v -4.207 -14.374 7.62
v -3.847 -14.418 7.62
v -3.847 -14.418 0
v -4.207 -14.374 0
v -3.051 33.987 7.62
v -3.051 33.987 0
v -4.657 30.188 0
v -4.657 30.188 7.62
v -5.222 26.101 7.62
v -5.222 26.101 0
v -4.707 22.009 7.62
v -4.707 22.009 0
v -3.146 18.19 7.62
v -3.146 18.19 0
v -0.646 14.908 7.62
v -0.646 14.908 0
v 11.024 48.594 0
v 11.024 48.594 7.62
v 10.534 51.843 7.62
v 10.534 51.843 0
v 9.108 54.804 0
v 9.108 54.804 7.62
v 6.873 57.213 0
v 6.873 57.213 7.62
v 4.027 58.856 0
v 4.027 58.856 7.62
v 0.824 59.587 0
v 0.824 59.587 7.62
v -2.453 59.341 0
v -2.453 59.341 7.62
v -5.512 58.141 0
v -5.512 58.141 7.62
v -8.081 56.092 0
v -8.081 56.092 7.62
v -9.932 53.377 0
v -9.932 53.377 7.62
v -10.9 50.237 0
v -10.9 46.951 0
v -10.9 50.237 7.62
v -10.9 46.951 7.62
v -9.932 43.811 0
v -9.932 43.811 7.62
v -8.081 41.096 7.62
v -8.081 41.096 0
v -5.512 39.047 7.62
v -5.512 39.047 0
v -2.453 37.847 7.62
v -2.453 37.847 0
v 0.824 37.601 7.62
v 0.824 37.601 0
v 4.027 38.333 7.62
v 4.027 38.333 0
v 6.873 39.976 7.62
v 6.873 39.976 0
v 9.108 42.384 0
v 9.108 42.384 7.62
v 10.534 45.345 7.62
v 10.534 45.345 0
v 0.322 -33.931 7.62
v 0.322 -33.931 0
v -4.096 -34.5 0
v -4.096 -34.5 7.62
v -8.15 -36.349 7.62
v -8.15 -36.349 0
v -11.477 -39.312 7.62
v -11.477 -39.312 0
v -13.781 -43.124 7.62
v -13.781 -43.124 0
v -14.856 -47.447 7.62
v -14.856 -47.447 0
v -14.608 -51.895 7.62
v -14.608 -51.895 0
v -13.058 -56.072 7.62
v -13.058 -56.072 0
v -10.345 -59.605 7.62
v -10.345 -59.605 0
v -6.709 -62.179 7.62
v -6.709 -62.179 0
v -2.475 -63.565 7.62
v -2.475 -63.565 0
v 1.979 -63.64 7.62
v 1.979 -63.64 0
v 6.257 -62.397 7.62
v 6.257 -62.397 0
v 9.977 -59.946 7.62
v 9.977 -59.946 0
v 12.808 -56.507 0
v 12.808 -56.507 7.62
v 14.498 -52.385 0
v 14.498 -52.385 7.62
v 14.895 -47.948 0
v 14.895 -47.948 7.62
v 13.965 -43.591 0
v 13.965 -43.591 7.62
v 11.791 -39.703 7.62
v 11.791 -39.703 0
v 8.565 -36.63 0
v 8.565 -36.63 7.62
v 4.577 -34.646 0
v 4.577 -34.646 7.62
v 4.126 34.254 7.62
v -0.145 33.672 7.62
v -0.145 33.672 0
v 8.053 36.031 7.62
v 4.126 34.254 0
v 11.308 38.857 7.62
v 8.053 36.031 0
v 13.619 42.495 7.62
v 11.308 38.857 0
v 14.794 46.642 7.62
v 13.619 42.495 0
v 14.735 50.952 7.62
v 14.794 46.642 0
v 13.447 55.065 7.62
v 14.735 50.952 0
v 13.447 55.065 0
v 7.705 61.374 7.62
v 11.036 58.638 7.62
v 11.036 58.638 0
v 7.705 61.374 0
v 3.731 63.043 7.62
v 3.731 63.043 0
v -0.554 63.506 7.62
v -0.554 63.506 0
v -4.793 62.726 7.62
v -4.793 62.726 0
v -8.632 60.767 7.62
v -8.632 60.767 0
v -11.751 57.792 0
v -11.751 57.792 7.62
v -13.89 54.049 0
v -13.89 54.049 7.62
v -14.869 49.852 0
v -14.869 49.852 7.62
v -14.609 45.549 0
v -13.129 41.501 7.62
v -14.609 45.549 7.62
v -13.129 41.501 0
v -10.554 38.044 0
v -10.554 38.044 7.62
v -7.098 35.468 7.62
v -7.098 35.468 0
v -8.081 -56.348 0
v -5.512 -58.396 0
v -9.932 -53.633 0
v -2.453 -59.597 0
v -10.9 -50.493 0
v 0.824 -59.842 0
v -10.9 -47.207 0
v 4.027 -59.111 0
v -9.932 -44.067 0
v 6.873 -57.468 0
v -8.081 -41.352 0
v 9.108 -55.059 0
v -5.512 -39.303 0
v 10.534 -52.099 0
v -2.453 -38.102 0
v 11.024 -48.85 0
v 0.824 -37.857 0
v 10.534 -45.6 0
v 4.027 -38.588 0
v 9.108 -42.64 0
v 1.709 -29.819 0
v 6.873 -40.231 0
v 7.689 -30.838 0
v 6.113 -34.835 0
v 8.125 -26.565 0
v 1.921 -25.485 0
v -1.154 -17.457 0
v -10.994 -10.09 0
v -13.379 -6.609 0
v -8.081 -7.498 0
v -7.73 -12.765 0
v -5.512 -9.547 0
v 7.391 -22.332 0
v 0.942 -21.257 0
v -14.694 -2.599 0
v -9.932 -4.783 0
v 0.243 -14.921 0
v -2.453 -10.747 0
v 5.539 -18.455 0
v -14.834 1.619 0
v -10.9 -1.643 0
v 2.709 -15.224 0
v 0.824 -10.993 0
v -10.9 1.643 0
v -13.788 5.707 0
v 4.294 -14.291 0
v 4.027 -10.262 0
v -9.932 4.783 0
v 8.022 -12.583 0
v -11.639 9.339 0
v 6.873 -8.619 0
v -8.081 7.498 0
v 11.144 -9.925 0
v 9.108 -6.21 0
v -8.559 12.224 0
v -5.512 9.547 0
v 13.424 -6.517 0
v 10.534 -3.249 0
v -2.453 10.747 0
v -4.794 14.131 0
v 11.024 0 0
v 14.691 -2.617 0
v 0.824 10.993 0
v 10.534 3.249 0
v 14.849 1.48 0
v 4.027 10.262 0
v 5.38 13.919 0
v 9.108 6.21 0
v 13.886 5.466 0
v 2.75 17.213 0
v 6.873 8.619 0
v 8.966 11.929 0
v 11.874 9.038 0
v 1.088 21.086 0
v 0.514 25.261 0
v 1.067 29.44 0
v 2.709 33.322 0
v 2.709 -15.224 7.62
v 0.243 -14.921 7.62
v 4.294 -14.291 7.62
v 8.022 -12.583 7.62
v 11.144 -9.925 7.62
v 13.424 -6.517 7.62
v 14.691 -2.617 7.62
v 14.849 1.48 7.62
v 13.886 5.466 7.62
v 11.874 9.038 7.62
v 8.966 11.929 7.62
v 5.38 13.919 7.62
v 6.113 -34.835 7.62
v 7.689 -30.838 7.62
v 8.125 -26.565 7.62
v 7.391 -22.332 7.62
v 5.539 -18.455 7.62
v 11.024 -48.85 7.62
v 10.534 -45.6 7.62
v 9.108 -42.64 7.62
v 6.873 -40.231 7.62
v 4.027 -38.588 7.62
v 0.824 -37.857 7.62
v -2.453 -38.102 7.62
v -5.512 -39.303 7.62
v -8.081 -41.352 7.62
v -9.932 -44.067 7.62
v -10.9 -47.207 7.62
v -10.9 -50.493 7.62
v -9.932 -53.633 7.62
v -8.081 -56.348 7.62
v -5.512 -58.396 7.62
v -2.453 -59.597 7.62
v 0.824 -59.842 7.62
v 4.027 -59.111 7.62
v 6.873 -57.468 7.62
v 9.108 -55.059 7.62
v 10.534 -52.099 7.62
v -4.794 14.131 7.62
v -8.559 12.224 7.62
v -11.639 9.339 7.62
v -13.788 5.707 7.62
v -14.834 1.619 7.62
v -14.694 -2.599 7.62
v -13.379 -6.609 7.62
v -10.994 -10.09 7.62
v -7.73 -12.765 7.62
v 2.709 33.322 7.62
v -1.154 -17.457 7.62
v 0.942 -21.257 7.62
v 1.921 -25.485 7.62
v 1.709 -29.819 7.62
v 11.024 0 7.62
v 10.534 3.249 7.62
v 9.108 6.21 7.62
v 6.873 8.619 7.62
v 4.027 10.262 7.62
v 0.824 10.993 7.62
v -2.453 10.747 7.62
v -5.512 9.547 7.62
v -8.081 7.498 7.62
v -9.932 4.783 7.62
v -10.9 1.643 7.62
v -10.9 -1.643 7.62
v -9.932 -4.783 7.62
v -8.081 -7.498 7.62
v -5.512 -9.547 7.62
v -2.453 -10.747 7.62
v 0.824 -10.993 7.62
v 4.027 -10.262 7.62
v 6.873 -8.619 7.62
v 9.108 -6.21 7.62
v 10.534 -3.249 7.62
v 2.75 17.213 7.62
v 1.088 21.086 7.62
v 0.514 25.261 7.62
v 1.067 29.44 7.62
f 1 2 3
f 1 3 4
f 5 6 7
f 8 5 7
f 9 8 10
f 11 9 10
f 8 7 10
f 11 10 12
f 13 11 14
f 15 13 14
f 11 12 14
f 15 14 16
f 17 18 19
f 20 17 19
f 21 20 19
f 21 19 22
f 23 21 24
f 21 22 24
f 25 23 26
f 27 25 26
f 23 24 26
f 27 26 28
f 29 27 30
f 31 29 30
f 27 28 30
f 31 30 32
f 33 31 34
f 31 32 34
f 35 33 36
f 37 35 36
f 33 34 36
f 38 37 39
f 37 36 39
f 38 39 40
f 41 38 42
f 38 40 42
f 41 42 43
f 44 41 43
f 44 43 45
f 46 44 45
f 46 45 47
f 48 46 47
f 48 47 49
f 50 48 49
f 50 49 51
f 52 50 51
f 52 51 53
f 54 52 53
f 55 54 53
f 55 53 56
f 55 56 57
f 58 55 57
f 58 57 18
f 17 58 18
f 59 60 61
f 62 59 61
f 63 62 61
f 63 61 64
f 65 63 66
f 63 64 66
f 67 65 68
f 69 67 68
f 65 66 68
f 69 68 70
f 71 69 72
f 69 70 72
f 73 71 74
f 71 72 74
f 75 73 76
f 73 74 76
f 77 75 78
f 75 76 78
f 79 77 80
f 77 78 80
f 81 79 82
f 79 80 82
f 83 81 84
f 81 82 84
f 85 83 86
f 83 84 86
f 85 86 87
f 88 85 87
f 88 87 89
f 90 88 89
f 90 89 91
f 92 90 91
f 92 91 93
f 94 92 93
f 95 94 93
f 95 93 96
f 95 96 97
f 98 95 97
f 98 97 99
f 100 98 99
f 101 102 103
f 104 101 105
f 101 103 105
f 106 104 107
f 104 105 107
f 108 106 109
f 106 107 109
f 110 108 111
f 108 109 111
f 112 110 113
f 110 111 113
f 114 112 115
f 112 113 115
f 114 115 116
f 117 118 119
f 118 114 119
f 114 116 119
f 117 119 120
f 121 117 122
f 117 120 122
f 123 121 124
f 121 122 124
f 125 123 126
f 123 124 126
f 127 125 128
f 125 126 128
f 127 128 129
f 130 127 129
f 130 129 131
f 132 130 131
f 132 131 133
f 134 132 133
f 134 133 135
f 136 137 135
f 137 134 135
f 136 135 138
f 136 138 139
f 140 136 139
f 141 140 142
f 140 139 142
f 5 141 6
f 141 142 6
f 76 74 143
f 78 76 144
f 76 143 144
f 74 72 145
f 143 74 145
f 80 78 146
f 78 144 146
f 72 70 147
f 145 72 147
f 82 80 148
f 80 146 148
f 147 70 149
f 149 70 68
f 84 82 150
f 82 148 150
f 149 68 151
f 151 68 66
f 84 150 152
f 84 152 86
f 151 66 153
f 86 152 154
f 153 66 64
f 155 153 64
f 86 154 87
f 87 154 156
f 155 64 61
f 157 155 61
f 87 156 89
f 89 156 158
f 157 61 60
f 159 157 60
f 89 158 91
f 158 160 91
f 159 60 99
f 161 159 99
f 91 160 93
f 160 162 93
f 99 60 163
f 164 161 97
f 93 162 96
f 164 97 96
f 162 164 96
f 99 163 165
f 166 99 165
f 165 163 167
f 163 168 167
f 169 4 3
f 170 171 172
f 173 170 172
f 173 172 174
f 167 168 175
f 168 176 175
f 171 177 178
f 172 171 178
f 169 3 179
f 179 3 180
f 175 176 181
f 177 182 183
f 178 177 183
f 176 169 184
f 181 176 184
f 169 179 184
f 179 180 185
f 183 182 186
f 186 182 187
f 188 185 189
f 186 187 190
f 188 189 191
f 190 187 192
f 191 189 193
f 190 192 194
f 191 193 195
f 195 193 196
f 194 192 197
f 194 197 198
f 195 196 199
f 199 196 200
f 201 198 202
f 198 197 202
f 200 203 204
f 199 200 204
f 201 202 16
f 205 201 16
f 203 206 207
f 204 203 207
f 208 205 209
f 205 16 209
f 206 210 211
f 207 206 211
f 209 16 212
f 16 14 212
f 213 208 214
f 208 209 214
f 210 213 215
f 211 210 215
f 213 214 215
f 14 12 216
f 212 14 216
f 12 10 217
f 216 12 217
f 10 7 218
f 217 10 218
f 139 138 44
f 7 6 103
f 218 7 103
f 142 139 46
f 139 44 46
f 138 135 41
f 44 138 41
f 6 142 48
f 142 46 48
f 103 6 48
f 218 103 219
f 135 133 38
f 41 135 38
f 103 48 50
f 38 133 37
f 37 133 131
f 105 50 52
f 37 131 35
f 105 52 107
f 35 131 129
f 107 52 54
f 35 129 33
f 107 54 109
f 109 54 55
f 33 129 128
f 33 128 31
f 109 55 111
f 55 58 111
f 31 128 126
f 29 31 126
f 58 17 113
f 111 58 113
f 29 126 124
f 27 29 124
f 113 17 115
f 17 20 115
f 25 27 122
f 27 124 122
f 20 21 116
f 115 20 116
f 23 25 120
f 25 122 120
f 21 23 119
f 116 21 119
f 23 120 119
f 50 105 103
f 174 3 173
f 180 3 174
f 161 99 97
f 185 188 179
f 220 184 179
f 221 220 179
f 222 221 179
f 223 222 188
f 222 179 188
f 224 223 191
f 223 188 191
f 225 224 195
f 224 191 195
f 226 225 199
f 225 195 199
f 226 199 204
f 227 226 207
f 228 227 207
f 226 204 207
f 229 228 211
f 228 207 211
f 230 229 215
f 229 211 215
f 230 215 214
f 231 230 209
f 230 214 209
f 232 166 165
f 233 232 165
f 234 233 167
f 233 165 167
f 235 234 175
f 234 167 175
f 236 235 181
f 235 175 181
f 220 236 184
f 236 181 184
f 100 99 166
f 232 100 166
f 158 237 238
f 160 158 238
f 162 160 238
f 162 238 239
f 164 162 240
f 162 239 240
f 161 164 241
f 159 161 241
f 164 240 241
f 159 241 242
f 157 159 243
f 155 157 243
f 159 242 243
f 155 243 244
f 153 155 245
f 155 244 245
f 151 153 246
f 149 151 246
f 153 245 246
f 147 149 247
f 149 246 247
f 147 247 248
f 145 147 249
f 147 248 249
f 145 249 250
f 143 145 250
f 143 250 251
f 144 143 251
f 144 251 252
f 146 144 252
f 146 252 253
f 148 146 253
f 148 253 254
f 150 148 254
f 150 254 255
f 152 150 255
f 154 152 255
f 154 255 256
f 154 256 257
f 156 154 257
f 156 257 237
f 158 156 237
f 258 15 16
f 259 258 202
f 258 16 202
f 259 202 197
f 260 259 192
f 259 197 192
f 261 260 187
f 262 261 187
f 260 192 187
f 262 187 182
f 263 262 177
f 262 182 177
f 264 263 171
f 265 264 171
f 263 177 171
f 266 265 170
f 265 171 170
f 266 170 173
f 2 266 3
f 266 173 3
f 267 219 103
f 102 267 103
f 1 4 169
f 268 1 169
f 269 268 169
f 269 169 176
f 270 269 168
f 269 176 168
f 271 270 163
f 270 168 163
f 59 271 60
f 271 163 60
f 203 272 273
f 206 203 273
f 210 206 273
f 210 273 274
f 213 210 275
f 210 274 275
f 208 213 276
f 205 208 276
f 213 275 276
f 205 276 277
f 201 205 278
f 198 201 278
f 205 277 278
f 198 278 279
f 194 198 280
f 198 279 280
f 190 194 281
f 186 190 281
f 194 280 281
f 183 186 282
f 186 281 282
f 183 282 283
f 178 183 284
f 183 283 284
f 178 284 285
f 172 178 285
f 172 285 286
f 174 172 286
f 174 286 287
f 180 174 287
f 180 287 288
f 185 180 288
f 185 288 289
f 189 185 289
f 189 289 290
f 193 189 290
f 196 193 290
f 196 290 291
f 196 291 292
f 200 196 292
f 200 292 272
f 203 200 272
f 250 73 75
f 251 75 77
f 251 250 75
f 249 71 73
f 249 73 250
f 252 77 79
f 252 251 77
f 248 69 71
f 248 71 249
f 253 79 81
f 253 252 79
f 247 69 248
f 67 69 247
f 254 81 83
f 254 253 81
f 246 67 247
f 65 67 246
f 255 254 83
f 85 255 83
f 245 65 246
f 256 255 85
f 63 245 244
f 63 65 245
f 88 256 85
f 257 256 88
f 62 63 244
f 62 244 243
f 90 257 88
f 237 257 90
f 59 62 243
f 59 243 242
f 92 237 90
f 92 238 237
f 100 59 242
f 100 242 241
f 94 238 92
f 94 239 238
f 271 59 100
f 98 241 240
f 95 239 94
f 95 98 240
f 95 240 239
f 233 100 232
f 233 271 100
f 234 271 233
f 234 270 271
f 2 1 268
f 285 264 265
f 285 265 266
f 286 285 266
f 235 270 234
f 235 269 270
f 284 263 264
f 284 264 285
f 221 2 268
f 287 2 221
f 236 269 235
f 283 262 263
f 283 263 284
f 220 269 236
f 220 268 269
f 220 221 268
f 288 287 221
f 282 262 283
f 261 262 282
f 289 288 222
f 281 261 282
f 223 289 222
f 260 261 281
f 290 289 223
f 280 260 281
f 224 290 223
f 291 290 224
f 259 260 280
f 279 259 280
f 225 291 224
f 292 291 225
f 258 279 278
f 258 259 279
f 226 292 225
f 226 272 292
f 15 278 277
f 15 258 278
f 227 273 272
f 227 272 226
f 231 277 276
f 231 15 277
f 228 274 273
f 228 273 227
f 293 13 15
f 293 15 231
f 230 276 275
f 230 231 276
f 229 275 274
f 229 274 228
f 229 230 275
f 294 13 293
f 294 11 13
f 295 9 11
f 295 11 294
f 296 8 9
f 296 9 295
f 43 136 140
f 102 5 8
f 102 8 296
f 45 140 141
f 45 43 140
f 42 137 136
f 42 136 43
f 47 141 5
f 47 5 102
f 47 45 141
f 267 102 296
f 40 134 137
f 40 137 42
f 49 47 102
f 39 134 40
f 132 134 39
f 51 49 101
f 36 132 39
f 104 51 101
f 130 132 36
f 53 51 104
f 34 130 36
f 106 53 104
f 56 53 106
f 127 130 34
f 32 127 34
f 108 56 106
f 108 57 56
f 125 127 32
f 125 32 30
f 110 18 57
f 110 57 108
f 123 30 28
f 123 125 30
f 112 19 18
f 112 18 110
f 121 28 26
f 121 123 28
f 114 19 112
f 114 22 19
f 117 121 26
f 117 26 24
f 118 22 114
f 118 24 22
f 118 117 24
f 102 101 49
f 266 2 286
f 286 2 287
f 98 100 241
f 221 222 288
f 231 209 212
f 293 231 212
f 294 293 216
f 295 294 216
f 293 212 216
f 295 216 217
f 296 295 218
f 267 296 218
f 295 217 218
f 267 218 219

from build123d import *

# Parameters (mm, degrees)
F0_R      = 14.9225
F1_DEPTH  = 7.62
F2_R      = 11.0236
F3_DEPTH  = 25.4
F5_DEPTH  = 7.62
F6_DEPTH  = 7.62
F7_R      = 14.9225
F8_DEPTH  = 7.62
F9_R      = 11.0236
F10_DEPTH = 25.4


with BuildPart() as f1:
    # F0 (on Top) → F1 (new body)
    with BuildSketch(Plane.XY):
        Circle(F0_R)
    extrude(amount=F1_DEPTH)

    # F2 (on face) → F3 (cut)
    with BuildSketch(Plane.XY.offset(7.62)):
        Circle(F2_R)
    extrude(amount=-F3_DEPTH, mode=Mode.SUBTRACT)

    # F4 (on Top) → F5 (join)
    with BuildSketch(Plane.XY):
        with BuildLine():
            Line((2.708977, 33.321824), (-3.027178, 34.026534))
            ThreePointArc((-3.027178, 34.026534), (-5.061644, 23.760928), (-0.211553, 14.487399))
            Line((-0.211553, 14.487399), (5.524602, 13.782689))
            ThreePointArc((5.524602, 13.782689), (0.674511, 23.056218), (2.708977, 33.321824))
        make_face()
        with BuildLine():
            Line((0.229531, -34.11213), (6.113042, -34.834943))
            ThreePointArc((6.113042, -34.834943), (7.902941, -24.423116), (2.708977, -15.223516))
            Line((2.708977, -15.223516), (-4.207222, -14.373833))
            ThreePointArc((-4.207222, -14.373833), (1.600579, -23.436154), (0.229531, -34.11213))
        make_face()
    extrude(amount=F5_DEPTH)

    # F4 (on Top) → F6 (join)
    with BuildSketch(Plane.XY):
        with BuildLine():
            Line((2.708977, 33.321824), (-3.027178, 34.026534))
            ThreePointArc((-3.027178, 34.026534), (-5.061644, 23.760928), (-0.211553, 14.487399))
            Line((-0.211553, 14.487399), (5.524602, 13.782689))
            ThreePointArc((5.524602, 13.782689), (0.674511, 23.056218), (2.708977, 33.321824))
        make_face()
        with BuildLine():
            Line((0.229531, -34.11213), (6.113042, -34.834943))
            ThreePointArc((6.113042, -34.834943), (7.902941, -24.423116), (2.708977, -15.223516))
            Line((2.708977, -15.223516), (-4.207222, -14.373833))
            ThreePointArc((-4.207222, -14.373833), (1.600579, -23.436154), (0.229531, -34.11213))
        make_face()
    extrude(amount=F6_DEPTH)

    # F7 (on Top) → F8 (join)
    with BuildSketch(Plane.XY):
        with Locations((0, 48.594203)):
            Circle(F7_R)
        with Locations((0, -48.849575)):
            Circle(F7_R)
    extrude(amount=F8_DEPTH)

    # F9 (on face) → F10 (cut)
    with BuildSketch(Plane.XY.offset(7.62)):
        with Locations((0, 48.594203)):
            Circle(F9_R)
        with Locations((0, -48.849575)):
            Circle(F9_R)
    extrude(amount=-F10_DEPTH, mode=Mode.SUBTRACT)


solid = f1.part
